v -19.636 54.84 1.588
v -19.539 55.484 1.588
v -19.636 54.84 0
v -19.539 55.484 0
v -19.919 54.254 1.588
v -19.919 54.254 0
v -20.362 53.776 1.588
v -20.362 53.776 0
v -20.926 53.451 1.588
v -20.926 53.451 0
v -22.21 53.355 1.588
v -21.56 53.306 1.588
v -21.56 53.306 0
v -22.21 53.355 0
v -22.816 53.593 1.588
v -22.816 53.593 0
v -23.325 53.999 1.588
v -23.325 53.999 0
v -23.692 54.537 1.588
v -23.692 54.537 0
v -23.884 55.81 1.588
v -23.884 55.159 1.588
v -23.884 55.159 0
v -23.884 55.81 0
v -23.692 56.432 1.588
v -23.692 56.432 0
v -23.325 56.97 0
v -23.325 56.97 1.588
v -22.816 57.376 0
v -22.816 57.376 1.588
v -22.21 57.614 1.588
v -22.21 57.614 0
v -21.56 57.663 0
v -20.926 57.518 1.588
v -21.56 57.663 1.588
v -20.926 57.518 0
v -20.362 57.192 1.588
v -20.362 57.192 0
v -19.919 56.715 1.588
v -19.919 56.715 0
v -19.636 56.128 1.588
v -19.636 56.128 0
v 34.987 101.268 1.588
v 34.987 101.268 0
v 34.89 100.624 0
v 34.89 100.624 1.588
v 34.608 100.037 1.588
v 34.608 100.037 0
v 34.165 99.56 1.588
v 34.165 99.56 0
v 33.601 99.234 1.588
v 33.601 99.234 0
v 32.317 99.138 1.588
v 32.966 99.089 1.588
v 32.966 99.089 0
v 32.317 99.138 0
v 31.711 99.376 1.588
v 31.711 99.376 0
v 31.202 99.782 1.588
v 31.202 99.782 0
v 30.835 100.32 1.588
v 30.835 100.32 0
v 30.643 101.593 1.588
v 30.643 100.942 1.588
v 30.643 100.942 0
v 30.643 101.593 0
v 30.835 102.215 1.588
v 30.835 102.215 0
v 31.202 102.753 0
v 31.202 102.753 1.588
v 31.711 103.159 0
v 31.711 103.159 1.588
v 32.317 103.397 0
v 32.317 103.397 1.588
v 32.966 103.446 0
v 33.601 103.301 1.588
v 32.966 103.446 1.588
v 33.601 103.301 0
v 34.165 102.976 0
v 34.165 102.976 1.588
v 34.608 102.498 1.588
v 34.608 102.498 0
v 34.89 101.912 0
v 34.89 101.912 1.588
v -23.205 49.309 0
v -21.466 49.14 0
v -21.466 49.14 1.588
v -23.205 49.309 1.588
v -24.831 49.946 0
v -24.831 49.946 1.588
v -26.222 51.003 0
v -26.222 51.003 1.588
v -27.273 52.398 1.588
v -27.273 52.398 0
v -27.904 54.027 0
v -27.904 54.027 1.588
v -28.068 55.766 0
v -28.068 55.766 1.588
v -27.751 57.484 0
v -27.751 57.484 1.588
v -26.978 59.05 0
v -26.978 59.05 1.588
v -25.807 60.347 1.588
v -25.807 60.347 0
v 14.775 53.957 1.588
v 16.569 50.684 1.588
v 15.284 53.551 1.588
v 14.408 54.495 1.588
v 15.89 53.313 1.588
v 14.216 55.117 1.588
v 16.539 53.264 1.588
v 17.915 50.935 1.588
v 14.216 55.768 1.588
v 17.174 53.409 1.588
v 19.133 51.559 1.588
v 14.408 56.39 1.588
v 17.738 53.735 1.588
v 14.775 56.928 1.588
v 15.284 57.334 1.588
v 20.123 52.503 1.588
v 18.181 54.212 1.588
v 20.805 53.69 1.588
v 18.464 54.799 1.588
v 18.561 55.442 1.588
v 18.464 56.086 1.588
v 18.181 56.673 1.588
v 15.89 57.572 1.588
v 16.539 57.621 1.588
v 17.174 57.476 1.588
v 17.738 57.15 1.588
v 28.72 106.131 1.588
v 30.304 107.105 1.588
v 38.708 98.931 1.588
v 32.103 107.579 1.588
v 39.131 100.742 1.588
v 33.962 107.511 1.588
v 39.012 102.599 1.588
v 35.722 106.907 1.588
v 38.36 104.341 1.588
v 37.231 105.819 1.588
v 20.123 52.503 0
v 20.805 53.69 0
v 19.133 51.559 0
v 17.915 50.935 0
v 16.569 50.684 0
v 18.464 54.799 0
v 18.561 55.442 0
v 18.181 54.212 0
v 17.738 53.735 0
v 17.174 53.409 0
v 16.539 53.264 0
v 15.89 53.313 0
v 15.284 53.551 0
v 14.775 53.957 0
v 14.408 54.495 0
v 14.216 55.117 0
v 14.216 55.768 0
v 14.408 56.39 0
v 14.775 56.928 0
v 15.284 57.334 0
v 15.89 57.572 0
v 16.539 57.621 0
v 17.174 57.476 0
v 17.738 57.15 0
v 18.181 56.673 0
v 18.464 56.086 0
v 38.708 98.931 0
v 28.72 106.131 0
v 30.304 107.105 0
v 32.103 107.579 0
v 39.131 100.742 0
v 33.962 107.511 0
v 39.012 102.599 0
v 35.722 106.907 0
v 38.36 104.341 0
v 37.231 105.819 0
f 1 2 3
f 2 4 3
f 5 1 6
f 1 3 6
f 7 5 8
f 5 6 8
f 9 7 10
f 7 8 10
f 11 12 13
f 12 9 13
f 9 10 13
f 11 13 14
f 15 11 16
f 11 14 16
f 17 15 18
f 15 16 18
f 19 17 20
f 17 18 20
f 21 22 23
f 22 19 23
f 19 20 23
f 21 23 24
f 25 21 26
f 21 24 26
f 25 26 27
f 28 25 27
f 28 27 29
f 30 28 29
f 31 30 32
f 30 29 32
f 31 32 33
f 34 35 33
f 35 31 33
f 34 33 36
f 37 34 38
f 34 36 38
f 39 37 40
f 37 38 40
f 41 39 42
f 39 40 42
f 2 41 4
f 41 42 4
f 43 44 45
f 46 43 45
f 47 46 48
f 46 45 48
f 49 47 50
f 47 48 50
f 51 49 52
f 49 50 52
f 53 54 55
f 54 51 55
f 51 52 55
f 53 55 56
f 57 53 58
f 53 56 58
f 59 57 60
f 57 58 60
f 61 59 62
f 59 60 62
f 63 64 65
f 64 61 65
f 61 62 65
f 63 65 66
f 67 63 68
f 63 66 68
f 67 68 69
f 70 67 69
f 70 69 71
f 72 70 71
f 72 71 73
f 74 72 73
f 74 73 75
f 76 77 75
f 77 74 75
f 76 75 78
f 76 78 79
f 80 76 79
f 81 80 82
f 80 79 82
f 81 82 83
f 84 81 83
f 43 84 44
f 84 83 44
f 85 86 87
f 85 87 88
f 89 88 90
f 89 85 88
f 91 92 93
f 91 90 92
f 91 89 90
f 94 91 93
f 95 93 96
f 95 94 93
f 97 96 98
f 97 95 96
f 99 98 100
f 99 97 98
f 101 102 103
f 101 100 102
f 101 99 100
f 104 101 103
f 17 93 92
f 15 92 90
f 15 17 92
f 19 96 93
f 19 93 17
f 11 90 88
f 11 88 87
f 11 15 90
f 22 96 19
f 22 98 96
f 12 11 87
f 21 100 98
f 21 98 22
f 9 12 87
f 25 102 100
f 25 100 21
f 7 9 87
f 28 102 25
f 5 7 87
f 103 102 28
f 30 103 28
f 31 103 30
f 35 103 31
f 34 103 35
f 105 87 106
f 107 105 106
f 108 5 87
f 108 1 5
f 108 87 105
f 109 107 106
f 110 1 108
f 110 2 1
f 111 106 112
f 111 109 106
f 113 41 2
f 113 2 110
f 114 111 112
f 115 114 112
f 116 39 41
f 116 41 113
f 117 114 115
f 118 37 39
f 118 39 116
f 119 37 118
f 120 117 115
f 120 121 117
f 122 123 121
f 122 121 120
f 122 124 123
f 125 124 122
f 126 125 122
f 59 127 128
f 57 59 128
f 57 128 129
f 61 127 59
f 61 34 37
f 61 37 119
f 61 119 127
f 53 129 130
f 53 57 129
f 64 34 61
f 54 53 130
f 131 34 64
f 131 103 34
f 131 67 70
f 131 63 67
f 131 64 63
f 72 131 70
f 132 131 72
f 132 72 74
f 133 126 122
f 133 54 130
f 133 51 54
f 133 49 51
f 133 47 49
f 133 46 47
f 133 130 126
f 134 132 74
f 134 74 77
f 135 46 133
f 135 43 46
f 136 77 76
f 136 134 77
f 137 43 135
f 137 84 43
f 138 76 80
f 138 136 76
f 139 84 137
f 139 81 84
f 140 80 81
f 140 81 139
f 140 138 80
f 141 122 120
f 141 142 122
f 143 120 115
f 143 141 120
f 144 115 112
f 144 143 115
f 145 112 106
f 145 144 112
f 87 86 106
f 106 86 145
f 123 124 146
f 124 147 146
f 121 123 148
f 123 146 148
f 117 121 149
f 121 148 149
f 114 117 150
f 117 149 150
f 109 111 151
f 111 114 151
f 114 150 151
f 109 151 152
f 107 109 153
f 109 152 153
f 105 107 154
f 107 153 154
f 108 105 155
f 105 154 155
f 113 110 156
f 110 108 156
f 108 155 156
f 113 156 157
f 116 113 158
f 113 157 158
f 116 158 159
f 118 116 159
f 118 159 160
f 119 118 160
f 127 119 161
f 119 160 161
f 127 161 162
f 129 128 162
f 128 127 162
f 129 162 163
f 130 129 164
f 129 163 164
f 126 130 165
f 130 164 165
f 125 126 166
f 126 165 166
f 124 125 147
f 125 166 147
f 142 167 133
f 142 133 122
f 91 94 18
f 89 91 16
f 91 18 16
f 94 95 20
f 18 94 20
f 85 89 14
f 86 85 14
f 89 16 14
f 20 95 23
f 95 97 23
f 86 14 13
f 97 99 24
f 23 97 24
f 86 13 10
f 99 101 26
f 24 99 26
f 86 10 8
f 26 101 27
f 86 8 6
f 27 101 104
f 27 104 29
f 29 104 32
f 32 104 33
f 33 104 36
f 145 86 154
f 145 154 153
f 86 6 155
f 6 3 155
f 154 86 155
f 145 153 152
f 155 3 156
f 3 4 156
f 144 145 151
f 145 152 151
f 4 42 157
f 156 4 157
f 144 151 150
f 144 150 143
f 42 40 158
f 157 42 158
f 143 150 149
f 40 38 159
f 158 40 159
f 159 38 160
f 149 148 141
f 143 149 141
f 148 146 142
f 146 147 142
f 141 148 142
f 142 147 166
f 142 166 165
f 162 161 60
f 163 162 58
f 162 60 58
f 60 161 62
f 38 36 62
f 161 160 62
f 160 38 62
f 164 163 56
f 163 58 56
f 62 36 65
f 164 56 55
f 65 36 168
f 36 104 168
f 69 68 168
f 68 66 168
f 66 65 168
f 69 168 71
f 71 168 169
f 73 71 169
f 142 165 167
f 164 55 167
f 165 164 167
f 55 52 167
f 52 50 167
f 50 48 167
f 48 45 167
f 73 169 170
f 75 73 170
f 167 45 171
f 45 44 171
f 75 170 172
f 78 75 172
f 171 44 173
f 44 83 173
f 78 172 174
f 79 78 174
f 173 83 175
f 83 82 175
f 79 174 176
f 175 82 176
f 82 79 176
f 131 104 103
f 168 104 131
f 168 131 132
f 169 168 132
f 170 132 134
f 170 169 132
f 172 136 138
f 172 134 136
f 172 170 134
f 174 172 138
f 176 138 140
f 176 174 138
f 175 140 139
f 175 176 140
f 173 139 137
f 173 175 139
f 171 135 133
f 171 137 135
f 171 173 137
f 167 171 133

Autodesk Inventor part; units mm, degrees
ref_plane "YZ Plane" through (0, 0, 0) normal (1, 0, 0) x (0, 1, 0)
ref_plane "XZ Plane" through (0, 0, 0) normal (0, 1, 0) x (-1, 0, 0)
ref_plane "XY Plane" through (0, 0, 0) normal (0, 0, 1) x (1, 0, 0)
sketch "main" plane through (0, 0, 0) normal (0, 0, 1) x (1, 0, 0)
  circle A0 centre (29.151, 60.8665) radius 2.1844
  circle A1 centre (29.151, 22.7665) radius 2.1844
  arc A2 (34.0093, 64.9555) -> (22.8065, 60.6019) centre (29.151, 60.8665) ccw
  arc A3 (24.3927, 22.568) -> (27.4035, 18.3362) centre (29.151, 22.7665) ccw
  circle A4 centre (74.9944, 6.3902) radius 2.1844
  arc A5 (72.6644, 0.4831) -> (79.8529, 10.4788) centre (74.9944, 6.3902) ccw
  line L0 (34.0093, 64.9555) -> (79.8529, 10.4788)
  line L1 (22.8065, 60.6019) -> (24.3927, 22.568)
  line L2 (72.6644, 0.4831) -> (27.4035, 18.3362)
  point P0 (-11.6855, 6.8462)
  point P1 (25.2705, 20.0056)
  dimension "d7" = 4.3688
  dimension "d8" = 12.7
  dimension "d9" = 9.525
sketch "Sketch1" plane through (0, 0, 0) normal (0, 0, 1) x (1, 0, 0)
  circle A0 centre (-21.7237, 55.4843) radius 2.1844
  circle A1 centre (16.3762, 55.4424) radius 2.1844
  arc A2 (-25.8074, 60.3471) -> (-21.4661, 49.1395) centre (-21.7237, 55.4843) ccw
  arc A3 (16.5694, 50.6838) -> (20.8046, 53.69) centre (16.3762, 55.4424) ccw
  circle A4 centre (32.803, 101.2677) radius 2.1844
  arc A5 (38.7075, 98.9311) -> (28.7197, 106.1307) centre (32.803, 101.2677) ccw
  line L0 (-25.8074, 60.3471) -> (28.7197, 106.1307)
  line L1 (-21.4661, 49.1395) -> (16.5694, 50.6838)
  line L2 (38.7075, 98.9311) -> (20.8046, 53.69)
extrude "Extrusion2" add sketch "Sketch1" along normal blind 1.5875
properties part number "half_motor_mount" material "Acetal Resin, White"
